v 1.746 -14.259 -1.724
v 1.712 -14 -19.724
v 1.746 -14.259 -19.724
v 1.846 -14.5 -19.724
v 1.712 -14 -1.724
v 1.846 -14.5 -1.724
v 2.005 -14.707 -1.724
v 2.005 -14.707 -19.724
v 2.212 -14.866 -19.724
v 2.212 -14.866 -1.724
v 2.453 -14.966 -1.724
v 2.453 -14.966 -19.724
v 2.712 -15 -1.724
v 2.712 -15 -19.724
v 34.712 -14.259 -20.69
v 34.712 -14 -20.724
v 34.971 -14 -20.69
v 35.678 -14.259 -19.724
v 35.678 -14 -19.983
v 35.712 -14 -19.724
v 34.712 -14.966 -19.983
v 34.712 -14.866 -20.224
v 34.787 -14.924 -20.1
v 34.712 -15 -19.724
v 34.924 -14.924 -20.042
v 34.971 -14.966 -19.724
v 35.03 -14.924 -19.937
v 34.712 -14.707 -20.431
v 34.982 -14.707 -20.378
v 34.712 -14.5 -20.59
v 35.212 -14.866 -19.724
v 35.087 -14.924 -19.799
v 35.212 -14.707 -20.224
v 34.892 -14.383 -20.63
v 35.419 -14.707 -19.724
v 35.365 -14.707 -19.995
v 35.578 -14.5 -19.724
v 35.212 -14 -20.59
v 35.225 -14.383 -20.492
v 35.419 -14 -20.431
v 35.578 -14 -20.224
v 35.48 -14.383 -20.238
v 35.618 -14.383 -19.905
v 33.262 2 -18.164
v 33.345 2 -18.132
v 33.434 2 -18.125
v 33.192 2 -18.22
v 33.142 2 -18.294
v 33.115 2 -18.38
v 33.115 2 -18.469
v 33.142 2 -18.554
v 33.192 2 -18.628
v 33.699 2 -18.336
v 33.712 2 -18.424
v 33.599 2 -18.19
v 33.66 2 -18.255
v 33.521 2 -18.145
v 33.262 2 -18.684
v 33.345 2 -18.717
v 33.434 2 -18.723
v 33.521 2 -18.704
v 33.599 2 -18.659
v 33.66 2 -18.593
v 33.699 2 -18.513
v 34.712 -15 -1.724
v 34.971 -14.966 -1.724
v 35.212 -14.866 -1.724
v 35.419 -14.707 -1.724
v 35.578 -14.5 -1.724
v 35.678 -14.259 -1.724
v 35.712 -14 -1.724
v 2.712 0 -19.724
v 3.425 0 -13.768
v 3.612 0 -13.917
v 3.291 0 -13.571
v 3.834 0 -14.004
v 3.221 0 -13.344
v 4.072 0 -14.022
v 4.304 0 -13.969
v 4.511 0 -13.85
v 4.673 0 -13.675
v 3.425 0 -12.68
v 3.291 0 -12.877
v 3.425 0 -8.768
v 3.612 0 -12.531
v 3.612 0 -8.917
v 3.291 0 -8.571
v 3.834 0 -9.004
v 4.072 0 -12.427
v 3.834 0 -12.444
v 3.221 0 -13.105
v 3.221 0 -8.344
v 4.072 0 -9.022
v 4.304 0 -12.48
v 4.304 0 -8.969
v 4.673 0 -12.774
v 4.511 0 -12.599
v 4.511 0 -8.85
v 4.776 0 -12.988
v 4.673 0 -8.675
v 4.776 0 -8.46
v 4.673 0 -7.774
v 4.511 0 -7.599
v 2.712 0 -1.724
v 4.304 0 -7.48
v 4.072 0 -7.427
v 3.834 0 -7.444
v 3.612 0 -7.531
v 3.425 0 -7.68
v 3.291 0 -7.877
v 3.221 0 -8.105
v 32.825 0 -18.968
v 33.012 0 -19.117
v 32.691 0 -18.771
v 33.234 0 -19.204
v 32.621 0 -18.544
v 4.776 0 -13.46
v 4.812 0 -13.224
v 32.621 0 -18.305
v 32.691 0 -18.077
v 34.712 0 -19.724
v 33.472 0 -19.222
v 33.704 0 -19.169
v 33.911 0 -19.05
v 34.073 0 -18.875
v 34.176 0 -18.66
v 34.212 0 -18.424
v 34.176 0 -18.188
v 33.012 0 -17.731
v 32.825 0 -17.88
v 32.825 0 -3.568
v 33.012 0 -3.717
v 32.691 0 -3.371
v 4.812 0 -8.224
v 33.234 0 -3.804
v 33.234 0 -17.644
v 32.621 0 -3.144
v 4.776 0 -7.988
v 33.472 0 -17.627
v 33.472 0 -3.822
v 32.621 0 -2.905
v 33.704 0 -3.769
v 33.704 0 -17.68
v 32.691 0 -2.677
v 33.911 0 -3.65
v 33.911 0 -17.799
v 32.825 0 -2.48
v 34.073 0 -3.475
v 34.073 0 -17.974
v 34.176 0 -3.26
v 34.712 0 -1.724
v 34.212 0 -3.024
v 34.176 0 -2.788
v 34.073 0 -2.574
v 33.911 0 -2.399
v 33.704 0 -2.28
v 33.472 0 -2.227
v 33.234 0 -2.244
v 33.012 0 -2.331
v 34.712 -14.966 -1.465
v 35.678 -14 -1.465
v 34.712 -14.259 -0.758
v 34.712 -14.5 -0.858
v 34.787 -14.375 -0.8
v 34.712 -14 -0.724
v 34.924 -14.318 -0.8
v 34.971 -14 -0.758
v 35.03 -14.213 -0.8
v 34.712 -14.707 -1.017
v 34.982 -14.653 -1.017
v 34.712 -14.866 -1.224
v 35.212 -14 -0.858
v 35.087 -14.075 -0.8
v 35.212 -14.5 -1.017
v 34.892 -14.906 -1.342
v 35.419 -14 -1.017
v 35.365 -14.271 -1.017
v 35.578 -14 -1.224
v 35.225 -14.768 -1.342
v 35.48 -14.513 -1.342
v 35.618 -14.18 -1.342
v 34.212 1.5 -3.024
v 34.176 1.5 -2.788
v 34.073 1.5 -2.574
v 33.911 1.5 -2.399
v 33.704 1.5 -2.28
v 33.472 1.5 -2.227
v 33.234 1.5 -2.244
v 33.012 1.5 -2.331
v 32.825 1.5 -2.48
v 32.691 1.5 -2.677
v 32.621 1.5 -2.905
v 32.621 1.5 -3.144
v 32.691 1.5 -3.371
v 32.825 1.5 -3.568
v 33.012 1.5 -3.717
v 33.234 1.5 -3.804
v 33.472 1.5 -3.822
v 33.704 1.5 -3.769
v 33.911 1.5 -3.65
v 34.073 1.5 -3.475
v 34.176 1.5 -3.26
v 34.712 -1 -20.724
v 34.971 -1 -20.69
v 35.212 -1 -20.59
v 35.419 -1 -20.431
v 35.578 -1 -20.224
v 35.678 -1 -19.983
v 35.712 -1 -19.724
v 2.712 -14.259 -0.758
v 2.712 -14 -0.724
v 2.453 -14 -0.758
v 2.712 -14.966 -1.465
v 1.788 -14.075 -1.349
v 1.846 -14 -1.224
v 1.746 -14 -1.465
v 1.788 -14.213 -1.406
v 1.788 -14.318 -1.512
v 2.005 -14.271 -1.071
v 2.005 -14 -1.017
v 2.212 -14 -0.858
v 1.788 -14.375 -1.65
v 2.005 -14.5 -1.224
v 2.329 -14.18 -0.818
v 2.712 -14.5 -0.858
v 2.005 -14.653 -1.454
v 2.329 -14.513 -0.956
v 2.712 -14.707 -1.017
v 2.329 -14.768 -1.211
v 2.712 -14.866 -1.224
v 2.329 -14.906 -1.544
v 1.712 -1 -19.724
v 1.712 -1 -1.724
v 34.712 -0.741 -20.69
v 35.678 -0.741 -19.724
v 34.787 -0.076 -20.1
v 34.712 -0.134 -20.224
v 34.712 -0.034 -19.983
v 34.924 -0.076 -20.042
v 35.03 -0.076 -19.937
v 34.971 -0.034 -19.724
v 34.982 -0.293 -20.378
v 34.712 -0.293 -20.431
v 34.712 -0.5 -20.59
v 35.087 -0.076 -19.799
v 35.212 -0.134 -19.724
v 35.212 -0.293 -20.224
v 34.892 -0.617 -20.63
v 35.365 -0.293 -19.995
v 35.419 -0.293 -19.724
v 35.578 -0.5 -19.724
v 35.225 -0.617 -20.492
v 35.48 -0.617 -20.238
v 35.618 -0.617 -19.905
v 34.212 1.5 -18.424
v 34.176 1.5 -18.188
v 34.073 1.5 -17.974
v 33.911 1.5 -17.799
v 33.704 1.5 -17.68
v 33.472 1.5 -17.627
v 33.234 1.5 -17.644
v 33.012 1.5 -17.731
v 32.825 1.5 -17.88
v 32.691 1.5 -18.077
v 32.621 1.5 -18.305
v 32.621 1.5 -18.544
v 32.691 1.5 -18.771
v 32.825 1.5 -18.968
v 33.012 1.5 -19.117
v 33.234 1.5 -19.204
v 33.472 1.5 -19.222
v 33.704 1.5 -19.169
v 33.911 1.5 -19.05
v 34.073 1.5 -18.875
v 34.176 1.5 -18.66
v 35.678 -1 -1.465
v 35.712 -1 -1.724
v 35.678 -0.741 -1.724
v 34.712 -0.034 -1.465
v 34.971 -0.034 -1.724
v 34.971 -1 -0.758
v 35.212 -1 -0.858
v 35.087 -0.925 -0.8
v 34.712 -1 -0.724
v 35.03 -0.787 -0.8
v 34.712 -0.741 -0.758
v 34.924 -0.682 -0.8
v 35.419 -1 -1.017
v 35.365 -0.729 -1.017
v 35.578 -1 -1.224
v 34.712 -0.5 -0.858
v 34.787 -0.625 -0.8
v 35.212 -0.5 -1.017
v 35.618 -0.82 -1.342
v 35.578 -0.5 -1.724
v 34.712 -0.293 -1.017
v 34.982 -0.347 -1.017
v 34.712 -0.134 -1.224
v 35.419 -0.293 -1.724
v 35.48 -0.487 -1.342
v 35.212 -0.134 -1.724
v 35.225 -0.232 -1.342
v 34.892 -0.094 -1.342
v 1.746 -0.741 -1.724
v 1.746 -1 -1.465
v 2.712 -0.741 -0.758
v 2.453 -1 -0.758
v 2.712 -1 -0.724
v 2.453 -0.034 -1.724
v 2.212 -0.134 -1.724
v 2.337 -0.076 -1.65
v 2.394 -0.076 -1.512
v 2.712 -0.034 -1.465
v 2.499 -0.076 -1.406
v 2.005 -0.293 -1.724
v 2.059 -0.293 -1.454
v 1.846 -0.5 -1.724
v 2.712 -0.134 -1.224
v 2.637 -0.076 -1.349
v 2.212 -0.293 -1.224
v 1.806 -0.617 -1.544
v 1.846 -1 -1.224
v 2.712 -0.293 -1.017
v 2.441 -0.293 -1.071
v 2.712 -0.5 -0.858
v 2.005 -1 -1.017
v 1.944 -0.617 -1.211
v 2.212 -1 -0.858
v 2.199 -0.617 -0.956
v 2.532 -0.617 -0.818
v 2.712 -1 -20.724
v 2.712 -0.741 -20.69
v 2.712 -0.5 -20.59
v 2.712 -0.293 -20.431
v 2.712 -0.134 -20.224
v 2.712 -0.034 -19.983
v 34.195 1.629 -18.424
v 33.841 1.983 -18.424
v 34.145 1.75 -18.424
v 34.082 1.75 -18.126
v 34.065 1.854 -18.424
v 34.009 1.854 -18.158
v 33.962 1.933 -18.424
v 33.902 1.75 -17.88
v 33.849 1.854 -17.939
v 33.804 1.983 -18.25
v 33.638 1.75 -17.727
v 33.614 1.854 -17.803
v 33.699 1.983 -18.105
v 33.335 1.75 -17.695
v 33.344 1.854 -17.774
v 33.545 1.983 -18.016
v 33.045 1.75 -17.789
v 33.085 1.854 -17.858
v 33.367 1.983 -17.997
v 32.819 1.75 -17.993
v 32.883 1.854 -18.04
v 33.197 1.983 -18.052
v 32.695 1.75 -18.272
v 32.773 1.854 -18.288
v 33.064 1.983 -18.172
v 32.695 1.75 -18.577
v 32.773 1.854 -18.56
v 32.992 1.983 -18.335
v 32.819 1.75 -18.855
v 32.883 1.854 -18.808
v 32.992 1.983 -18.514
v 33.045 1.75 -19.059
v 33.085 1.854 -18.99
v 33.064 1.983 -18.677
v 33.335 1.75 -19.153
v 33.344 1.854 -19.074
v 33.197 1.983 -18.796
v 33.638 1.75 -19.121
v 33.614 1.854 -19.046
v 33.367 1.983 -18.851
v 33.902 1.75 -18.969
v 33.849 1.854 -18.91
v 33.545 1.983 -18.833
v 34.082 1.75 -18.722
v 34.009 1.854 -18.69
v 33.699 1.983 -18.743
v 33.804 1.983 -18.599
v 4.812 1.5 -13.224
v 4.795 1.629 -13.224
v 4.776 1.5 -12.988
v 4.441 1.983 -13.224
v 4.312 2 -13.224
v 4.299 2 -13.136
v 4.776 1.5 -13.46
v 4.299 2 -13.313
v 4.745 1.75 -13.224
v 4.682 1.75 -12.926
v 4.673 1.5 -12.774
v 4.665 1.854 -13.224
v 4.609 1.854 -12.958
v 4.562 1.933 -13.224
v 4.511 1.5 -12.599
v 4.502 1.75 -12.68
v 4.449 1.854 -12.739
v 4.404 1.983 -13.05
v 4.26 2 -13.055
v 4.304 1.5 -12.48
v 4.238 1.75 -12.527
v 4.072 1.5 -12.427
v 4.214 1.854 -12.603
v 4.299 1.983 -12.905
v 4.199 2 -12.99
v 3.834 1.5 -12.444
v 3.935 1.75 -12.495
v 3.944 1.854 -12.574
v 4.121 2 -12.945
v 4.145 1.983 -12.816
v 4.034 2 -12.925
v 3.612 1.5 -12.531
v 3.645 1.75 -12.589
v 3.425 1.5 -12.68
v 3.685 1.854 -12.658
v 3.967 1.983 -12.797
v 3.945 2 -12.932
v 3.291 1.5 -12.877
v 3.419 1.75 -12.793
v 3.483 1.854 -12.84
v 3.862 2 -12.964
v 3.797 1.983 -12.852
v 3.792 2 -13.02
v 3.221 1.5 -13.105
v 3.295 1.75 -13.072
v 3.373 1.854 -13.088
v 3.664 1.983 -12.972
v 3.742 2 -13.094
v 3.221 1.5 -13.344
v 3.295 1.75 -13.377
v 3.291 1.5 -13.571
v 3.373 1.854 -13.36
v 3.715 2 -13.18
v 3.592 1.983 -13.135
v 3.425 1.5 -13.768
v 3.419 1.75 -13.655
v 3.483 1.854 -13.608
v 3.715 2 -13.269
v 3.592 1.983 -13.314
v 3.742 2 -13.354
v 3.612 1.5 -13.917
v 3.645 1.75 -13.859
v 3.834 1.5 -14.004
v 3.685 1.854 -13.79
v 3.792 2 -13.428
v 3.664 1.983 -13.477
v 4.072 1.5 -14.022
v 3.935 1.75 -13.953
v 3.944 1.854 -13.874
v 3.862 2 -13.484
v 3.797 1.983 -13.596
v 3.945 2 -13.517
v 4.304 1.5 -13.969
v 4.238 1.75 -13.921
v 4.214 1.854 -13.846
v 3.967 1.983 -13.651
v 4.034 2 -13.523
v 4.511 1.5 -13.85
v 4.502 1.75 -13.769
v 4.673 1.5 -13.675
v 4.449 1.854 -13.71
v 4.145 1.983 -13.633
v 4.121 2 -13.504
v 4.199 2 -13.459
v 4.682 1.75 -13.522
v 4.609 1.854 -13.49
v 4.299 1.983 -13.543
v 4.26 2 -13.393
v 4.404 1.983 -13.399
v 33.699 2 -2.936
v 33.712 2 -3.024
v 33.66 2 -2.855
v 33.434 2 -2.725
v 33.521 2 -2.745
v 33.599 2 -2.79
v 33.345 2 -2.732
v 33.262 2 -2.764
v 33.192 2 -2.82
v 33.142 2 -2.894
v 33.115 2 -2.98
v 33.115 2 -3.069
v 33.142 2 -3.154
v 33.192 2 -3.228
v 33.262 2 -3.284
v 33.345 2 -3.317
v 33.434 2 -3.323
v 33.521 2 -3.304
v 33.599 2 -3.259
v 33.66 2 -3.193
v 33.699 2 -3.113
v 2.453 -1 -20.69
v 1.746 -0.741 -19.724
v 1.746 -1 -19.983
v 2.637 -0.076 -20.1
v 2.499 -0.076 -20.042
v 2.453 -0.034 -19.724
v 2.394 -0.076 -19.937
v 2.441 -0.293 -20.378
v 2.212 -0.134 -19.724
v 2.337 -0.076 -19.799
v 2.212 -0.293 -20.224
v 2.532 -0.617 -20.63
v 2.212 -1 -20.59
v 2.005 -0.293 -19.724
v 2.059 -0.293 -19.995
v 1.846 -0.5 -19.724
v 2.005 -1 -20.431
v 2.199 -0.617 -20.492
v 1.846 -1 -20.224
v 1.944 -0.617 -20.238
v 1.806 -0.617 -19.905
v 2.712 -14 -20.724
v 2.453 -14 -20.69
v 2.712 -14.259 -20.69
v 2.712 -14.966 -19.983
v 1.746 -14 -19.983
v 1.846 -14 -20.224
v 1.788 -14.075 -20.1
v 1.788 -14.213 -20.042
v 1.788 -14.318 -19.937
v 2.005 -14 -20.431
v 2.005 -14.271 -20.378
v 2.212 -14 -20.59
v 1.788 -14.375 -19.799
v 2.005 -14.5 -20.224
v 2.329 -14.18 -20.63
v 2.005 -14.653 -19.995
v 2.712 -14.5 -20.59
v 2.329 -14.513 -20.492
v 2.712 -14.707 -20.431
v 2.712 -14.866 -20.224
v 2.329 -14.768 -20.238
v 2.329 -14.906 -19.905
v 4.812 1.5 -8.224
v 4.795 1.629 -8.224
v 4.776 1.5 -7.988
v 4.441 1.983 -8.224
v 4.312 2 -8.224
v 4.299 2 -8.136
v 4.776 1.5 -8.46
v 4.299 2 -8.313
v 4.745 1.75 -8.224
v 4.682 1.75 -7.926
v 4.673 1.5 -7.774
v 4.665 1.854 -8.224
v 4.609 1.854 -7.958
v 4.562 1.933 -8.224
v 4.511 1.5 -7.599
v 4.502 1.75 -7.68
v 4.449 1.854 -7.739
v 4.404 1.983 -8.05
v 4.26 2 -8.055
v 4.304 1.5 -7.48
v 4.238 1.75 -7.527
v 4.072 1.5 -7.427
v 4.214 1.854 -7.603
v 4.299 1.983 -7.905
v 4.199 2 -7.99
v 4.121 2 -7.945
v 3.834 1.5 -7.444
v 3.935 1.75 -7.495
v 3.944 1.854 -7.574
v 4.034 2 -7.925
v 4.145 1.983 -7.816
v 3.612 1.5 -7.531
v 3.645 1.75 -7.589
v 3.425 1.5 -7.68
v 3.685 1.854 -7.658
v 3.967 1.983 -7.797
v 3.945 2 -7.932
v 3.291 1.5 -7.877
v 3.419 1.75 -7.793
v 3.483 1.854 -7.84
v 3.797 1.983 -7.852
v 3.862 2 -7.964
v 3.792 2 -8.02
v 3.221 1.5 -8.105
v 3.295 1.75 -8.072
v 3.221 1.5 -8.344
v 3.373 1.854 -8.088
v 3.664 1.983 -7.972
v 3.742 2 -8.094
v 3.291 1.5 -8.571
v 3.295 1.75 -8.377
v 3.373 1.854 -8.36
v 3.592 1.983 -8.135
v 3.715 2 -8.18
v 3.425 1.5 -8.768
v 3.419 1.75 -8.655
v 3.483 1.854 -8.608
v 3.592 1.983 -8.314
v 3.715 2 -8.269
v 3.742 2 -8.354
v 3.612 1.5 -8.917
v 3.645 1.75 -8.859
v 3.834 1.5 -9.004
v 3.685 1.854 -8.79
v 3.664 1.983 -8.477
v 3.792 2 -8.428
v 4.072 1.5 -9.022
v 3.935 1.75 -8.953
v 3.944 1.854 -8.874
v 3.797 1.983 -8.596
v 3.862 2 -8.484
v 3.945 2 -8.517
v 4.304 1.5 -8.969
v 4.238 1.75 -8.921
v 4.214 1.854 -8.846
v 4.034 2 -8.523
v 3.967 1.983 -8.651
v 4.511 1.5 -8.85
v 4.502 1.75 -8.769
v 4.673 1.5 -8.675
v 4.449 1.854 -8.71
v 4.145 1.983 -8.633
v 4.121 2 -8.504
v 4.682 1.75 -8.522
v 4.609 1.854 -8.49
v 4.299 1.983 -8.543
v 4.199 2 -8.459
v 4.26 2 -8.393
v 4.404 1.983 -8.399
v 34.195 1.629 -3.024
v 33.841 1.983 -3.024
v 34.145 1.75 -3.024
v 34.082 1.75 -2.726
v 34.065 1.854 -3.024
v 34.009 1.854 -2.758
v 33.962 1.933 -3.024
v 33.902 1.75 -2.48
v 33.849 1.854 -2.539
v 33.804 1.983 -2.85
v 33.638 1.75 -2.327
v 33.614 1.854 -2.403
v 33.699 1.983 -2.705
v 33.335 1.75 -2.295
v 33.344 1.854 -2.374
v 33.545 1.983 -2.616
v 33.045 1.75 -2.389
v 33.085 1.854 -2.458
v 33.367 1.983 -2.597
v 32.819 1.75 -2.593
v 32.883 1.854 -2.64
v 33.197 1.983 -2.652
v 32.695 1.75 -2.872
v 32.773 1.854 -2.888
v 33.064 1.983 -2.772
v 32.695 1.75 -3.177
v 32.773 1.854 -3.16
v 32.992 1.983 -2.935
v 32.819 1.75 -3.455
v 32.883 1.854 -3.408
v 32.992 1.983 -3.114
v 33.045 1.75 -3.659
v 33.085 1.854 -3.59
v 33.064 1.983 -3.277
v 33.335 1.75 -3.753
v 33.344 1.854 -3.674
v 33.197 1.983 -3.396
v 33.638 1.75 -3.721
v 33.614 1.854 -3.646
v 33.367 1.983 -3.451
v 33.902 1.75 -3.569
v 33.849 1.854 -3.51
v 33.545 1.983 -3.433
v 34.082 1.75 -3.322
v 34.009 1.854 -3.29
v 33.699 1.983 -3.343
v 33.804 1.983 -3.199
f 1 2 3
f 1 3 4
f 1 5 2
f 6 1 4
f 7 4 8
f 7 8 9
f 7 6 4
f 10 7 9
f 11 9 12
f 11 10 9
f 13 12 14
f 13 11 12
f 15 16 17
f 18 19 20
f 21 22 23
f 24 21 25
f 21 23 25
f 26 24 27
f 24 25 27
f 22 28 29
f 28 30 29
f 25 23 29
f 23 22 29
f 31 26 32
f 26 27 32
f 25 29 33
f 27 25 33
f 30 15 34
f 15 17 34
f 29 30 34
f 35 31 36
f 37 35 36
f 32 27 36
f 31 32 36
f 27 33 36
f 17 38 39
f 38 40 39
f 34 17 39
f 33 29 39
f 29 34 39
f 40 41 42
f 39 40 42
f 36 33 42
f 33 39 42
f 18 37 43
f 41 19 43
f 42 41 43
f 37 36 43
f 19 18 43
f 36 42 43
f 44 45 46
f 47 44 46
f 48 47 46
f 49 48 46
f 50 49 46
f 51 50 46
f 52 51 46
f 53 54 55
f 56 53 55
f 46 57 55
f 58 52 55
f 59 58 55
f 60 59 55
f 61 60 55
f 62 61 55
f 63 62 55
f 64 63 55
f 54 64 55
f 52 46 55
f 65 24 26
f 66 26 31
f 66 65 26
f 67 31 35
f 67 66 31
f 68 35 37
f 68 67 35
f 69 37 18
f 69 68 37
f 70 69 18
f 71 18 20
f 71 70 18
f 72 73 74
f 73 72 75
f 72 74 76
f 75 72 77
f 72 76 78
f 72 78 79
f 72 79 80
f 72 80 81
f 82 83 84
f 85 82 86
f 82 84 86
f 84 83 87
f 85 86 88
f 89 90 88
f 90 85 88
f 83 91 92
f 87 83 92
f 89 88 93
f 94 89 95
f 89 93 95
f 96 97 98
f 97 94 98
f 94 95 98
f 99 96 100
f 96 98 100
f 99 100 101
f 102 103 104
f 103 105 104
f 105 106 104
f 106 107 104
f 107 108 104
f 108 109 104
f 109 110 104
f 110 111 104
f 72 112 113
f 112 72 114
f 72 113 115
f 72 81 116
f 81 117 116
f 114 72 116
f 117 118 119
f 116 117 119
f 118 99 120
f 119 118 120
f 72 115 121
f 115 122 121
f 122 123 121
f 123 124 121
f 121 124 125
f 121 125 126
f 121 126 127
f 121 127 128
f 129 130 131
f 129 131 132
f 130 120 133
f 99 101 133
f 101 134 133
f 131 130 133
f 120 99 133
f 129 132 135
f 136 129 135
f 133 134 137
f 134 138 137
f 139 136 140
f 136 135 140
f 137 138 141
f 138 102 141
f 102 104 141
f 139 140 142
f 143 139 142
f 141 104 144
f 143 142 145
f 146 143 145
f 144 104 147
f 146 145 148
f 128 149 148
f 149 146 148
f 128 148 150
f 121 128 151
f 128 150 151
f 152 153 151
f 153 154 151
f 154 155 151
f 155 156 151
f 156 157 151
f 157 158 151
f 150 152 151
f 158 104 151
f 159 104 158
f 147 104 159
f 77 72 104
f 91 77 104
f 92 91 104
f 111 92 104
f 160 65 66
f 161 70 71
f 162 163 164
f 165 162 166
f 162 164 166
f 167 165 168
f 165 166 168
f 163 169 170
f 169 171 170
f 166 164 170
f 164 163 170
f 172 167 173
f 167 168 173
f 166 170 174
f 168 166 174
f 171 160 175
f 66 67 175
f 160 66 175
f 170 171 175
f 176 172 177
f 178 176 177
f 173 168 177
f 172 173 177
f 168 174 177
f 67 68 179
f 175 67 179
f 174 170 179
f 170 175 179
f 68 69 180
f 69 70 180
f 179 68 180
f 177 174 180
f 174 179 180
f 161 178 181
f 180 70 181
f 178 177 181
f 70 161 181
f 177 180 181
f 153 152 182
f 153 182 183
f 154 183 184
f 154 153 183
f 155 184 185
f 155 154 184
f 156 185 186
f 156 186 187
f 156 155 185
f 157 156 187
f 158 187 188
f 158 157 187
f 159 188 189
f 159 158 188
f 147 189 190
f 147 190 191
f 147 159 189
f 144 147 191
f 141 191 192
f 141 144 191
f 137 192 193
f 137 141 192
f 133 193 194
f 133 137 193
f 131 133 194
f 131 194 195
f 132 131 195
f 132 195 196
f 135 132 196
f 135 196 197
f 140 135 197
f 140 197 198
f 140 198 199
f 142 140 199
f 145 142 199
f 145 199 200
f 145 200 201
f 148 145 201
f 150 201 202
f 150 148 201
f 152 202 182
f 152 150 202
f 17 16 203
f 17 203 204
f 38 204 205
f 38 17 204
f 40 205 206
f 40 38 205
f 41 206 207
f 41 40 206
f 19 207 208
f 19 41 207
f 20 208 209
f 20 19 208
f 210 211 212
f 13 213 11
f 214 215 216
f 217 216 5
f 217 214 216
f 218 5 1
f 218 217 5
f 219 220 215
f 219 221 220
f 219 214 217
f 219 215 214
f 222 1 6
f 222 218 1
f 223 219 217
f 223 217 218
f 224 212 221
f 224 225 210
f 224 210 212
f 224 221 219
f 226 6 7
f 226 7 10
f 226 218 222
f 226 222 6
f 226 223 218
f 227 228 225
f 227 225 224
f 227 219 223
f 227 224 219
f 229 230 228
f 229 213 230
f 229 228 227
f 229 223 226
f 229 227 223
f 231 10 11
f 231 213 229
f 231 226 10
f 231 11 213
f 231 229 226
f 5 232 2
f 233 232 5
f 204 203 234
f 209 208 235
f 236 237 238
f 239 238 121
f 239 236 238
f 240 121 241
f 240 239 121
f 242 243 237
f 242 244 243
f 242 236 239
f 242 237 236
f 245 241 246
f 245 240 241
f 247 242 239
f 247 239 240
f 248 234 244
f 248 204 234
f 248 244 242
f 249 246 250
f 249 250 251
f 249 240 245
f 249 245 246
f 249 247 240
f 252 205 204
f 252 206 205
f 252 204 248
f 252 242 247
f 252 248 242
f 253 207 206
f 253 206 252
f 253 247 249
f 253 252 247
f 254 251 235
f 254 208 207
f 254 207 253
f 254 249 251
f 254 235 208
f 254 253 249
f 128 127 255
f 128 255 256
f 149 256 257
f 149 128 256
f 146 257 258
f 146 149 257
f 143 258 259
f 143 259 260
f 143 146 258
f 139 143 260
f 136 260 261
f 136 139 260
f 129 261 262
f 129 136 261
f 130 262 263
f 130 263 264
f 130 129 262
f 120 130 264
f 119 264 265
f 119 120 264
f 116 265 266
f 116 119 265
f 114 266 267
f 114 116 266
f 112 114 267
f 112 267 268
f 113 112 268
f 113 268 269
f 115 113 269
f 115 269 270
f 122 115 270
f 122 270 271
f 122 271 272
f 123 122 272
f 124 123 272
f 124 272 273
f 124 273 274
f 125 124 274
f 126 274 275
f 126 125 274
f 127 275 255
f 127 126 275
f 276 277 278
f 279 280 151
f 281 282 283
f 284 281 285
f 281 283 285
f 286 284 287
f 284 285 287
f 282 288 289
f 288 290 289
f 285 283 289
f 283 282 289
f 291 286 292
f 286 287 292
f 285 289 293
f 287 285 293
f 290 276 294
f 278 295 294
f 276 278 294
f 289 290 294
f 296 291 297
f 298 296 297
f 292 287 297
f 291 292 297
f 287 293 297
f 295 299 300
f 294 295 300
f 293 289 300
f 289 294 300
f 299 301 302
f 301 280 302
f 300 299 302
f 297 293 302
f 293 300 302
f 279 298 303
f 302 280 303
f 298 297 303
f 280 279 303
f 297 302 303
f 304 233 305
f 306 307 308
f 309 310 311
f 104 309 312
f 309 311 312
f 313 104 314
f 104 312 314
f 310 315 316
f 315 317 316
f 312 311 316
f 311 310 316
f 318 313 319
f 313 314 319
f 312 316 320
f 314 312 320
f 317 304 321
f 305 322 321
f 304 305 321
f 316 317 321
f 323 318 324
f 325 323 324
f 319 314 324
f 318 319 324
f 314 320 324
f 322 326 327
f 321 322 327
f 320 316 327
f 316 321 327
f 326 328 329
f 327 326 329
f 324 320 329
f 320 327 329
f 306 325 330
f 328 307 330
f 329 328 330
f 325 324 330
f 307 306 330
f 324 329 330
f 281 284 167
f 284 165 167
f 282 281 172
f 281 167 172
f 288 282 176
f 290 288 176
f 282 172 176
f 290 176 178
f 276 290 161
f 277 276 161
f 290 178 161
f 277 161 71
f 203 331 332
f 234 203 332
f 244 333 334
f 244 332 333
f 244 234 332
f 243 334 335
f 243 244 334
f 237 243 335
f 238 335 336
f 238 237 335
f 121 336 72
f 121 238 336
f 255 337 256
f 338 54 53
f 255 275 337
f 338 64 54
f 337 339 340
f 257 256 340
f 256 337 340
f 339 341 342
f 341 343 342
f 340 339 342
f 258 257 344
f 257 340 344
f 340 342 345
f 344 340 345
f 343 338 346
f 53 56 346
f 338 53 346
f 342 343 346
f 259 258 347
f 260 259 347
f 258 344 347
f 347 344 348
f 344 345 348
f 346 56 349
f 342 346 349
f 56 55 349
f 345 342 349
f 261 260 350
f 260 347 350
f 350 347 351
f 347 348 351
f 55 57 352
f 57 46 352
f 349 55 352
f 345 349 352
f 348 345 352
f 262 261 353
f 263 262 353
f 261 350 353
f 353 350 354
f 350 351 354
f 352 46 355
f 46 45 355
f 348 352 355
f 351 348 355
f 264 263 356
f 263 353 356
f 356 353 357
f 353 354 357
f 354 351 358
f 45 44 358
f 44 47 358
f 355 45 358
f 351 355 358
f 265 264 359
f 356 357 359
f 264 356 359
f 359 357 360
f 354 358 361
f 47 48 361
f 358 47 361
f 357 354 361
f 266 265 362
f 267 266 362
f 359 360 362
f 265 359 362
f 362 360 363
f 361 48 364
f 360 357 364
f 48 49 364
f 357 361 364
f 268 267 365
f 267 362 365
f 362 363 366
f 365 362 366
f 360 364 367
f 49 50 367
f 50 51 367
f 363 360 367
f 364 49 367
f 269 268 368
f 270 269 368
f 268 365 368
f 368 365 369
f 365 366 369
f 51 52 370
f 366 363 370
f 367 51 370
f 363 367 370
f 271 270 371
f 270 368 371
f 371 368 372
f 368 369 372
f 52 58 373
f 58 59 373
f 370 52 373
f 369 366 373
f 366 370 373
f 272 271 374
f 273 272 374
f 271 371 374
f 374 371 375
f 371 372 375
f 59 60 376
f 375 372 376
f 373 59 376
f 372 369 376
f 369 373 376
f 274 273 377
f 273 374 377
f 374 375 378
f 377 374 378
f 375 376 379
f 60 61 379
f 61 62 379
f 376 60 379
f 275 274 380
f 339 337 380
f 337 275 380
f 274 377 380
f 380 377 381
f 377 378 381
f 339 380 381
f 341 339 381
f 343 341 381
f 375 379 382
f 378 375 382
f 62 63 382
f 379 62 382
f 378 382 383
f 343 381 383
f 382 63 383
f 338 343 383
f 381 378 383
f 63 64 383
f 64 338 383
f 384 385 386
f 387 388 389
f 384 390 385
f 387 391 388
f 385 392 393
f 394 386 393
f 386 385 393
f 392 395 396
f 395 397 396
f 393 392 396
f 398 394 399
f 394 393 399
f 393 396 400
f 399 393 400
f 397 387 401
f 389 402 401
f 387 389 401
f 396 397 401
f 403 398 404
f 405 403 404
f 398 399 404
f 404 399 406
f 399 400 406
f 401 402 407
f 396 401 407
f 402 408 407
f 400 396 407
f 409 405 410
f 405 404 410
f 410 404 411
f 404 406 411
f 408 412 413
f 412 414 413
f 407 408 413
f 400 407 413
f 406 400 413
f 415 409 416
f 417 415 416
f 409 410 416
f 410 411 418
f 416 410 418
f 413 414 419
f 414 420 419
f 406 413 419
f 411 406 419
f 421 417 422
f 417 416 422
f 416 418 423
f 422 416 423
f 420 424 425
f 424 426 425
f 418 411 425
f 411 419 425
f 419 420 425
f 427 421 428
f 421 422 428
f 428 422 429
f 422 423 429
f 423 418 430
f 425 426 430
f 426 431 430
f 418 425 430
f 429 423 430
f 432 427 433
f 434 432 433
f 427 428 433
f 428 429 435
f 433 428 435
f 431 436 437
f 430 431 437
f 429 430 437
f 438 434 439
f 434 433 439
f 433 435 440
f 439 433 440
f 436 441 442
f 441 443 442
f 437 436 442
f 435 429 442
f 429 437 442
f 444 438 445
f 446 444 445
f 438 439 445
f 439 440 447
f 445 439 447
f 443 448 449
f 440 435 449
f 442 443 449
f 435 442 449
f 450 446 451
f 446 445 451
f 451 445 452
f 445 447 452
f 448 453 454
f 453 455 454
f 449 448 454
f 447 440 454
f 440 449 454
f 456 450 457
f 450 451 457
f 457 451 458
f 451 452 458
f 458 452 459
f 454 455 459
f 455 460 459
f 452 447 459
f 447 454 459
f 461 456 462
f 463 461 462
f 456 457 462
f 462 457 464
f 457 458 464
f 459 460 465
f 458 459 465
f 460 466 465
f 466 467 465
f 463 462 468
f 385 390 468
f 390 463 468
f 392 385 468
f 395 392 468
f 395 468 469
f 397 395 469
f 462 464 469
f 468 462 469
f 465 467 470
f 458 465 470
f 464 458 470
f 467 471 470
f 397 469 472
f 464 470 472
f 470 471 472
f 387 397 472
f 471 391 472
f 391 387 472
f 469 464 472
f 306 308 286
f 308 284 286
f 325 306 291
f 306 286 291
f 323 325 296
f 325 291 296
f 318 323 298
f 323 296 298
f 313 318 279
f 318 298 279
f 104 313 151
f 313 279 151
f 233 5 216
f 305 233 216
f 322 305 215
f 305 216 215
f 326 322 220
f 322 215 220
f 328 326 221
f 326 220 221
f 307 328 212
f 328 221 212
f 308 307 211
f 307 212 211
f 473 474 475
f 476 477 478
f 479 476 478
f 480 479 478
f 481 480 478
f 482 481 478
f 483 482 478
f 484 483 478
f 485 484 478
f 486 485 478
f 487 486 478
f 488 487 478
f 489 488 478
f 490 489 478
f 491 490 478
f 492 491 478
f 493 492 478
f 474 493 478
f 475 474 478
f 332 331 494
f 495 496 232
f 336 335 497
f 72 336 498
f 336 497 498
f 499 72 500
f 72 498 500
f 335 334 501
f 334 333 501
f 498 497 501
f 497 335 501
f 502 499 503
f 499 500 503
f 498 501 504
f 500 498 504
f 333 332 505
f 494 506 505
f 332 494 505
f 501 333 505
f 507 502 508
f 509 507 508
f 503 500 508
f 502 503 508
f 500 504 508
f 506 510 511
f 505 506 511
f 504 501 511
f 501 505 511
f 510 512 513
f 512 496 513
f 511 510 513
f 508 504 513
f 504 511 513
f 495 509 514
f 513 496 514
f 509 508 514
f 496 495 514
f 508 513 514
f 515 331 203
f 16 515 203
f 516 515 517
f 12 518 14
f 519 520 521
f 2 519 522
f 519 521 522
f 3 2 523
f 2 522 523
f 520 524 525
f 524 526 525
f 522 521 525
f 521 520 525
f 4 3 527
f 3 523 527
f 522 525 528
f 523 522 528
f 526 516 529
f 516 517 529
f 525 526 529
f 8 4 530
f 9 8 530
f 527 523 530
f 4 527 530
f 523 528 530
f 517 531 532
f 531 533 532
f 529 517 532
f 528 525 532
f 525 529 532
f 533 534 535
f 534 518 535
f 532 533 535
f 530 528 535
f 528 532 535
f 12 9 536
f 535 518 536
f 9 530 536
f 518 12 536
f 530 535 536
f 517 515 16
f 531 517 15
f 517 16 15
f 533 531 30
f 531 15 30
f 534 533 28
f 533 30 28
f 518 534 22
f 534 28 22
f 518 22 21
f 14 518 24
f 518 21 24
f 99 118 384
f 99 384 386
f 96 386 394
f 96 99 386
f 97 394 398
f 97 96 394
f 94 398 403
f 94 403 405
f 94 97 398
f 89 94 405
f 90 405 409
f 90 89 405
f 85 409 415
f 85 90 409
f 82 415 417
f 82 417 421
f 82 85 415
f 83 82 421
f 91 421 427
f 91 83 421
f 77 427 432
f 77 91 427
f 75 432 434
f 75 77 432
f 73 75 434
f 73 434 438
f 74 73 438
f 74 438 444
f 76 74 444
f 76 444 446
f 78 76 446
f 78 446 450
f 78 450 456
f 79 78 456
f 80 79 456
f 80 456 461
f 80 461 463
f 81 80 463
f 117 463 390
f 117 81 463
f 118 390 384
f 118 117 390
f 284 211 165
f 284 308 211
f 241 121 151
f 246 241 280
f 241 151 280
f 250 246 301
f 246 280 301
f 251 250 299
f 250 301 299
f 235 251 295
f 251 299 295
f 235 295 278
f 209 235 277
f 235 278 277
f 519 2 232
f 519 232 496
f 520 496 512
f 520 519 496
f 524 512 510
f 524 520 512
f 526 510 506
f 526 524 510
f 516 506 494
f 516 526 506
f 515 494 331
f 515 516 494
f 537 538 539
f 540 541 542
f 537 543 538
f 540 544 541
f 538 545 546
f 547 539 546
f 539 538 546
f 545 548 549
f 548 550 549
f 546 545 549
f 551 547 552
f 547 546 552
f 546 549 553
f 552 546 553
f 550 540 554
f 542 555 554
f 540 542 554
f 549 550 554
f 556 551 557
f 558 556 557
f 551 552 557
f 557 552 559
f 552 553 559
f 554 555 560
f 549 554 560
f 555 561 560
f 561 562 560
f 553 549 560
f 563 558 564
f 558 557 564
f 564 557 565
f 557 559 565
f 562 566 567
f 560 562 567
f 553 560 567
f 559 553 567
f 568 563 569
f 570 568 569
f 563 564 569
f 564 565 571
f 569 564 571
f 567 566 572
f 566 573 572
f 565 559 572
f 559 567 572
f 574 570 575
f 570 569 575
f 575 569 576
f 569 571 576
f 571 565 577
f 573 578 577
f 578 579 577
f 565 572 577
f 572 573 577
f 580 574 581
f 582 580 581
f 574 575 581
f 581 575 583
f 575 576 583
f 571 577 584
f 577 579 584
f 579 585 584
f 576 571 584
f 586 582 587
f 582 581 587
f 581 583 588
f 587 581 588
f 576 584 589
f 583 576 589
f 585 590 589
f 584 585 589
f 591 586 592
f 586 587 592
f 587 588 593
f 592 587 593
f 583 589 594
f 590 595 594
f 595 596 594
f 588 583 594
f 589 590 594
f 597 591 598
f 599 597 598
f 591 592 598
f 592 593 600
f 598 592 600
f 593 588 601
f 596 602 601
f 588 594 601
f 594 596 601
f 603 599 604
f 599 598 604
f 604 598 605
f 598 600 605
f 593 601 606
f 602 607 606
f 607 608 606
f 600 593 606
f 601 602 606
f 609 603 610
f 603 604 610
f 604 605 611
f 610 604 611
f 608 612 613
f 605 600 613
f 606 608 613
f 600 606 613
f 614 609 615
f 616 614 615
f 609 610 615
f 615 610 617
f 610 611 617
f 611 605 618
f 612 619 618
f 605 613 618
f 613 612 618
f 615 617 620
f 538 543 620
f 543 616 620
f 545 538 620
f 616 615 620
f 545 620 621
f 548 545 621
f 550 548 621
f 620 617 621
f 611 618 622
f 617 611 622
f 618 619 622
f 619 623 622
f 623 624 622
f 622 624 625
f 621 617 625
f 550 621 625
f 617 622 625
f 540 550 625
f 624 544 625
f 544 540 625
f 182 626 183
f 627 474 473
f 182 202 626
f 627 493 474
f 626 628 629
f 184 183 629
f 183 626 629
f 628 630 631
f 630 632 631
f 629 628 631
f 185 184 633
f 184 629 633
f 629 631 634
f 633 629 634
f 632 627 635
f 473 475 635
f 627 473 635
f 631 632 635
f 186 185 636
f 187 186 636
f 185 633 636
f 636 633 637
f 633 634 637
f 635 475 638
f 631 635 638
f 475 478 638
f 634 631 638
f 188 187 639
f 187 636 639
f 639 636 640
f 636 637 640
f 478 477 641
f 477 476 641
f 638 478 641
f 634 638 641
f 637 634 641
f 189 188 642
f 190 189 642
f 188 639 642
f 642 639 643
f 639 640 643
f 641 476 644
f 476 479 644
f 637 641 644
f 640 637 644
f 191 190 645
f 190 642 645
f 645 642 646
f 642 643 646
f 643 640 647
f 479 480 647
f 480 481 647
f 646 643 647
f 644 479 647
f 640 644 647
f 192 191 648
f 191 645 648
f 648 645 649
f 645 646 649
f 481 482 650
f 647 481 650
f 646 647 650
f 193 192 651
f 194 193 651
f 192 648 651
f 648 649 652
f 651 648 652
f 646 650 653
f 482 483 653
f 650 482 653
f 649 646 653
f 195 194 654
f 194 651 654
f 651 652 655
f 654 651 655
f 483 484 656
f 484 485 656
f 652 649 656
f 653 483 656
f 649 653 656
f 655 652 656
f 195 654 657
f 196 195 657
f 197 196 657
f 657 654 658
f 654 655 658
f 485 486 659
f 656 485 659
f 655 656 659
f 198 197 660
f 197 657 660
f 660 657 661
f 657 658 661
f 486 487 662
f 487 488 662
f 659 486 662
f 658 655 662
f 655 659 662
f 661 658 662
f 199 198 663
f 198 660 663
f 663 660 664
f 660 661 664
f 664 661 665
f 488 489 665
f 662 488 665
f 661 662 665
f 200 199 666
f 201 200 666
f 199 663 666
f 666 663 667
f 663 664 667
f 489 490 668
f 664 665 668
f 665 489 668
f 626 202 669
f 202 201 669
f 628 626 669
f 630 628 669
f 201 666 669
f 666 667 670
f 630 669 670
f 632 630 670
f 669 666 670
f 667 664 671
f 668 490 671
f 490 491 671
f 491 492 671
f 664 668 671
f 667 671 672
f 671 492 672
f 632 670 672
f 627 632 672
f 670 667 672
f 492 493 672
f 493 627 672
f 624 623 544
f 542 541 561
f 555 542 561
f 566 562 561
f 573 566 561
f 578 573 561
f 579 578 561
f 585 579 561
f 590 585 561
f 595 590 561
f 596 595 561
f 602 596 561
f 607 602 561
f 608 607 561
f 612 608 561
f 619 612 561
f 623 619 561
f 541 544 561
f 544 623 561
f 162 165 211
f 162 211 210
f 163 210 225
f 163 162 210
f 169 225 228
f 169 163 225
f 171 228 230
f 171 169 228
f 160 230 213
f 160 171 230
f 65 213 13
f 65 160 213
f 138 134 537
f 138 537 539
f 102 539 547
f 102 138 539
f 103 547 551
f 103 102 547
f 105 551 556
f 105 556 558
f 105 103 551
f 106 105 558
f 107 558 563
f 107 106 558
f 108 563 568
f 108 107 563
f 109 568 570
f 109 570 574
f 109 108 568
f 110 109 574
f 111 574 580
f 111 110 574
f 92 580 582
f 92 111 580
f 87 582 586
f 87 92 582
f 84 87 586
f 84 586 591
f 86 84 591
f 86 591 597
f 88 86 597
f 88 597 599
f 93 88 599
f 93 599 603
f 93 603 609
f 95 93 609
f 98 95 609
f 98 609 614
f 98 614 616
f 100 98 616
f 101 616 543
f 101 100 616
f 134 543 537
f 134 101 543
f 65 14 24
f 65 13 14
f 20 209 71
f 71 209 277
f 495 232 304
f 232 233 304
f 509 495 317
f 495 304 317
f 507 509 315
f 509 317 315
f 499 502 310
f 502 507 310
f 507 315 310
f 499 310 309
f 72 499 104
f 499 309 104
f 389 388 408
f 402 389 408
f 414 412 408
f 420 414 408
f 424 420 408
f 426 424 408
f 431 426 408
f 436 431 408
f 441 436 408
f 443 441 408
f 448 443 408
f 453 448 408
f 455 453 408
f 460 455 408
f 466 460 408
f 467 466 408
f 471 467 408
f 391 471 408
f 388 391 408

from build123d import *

# Parameters (mm, degrees)
SKETCH_W     = 34
SKETCH_H     = 20
PAD_DEPTH    = 15
SKETCH001_R  = 0.8
PAD001_DEPTH = 2
FILLET_R     = 1
FILLET001_R  = 0.5


with BuildPart() as part:
    # Sketch → Pad (new body)
    with BuildSketch(Plane.XZ):
        with Locations((18.71189, -10.724301)):
            Rectangle(SKETCH_W, SKETCH_H)
    extrude(amount=PAD_DEPTH)

    # Sketch001 → Pad001 (join)
    with BuildSketch(Plane.XZ):
        with Locations((4.01189, -13.224301)):
            Circle(SKETCH001_R)
        with Locations((4.01189, -8.224301)):
            Circle(SKETCH001_R)
        with Locations((33.41189, -18.424301)):
            Circle(SKETCH001_R)
        with Locations((33.41189, -3.024301)):
            Circle(SKETCH001_R)
    extrude(amount=-PAD001_DEPTH)

    # Fillet
    fillet_edges = [part.edges().sort_by_distance(p)[0] for p in [
        (35.71189, -7.5, -20.724301),
        (18.71189, -15, -20.724301),
        (1.71189, -7.5, -20.724301),
        (18.71189, 0, -20.724301),
        (35.71189, -15, -10.724301),
        (35.71189, 0, -10.724301),
        (18.71189, -15, -0.724301),
        (35.71189, -7.5, -0.724301),
        (1.71189, -7.5, -0.724301),
        (1.71189, -15, -10.724301),
        (1.71189, 0, -10.724301),
        (18.71189, 0, -0.724301),
    ]]
    fillet(fillet_edges, radius=FILLET_R)

    # Fillet001
    fillet001_edges = [part.edges().sort_by_distance(p)[0] for p in [
        (3.21189, 2, -13.224301),
        (3.21189, 2, -8.224301),
        (32.61189, 2, -3.024301),
        (32.61189, 2, -18.424301),
    ]]
    fillet(fillet001_edges, radius=FILLET001_R)


solid = part.part
